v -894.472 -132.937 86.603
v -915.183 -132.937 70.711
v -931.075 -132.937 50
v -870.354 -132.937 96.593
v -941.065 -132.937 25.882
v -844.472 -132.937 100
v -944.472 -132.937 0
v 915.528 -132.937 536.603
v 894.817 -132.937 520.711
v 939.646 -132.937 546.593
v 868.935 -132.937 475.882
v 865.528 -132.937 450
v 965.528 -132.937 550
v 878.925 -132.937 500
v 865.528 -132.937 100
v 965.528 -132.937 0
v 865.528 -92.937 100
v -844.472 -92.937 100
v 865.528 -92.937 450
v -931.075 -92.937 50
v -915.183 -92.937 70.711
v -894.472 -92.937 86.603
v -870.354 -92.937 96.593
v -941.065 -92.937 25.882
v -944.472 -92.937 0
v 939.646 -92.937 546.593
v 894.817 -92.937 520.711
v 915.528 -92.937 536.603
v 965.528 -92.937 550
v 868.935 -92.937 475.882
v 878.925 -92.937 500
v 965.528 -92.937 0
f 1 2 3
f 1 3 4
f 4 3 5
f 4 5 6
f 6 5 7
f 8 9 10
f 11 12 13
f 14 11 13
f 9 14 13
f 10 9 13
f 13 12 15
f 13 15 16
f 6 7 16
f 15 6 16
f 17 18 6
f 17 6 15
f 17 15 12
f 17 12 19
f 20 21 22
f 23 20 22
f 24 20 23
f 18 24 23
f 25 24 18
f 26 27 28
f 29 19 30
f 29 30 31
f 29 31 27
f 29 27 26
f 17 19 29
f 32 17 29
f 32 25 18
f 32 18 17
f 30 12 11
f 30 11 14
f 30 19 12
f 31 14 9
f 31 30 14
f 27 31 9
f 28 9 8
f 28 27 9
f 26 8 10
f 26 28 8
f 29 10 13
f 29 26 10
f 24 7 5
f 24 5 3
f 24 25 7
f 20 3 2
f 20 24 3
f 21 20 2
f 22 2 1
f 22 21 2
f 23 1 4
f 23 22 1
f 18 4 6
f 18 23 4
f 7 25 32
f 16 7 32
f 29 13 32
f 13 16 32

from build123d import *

# Parameters (mm, degrees)
F0_W     = 1910
F0_H     = 40
F1_DEPTH = 100
F2_W     = 100
F2_H     = 40
F3_DEPTH = 450
F4_R     = 99.99999


# Not quite as in the source:
# - a fillet or chamfer is up to 0.001 mm smaller than in the source, because OpenCascade refuses the exact size


with BuildPart() as f1:
    # F0 (on Top) → F1 (new body)
    with BuildSketch(Plane.XY):
        with Locations((10.5278193951, -112.9367578724)):
            Rectangle(F0_W, F0_H)
    extrude(amount=F1_DEPTH)

    # F2 (on face) → F3 (join)
    with BuildSketch(Plane.XY.offset(100)):
        with Locations((915.5278193951, -112.9367578724)):
            Rectangle(F2_W, F2_H)
    extrude(amount=F3_DEPTH)

    # F4 (radius 100 in the source; OpenCascade refuses exactly that, so slightly less here)
    f4_edges = [f1.edges().sort_by_distance(p)[0] for p in [
        (-944.472181, -112.936758, 100),
        (865.527819, -112.936758, 550),
    ]]
    fillet(f4_edges, radius=F4_R)


solid = f1.part
